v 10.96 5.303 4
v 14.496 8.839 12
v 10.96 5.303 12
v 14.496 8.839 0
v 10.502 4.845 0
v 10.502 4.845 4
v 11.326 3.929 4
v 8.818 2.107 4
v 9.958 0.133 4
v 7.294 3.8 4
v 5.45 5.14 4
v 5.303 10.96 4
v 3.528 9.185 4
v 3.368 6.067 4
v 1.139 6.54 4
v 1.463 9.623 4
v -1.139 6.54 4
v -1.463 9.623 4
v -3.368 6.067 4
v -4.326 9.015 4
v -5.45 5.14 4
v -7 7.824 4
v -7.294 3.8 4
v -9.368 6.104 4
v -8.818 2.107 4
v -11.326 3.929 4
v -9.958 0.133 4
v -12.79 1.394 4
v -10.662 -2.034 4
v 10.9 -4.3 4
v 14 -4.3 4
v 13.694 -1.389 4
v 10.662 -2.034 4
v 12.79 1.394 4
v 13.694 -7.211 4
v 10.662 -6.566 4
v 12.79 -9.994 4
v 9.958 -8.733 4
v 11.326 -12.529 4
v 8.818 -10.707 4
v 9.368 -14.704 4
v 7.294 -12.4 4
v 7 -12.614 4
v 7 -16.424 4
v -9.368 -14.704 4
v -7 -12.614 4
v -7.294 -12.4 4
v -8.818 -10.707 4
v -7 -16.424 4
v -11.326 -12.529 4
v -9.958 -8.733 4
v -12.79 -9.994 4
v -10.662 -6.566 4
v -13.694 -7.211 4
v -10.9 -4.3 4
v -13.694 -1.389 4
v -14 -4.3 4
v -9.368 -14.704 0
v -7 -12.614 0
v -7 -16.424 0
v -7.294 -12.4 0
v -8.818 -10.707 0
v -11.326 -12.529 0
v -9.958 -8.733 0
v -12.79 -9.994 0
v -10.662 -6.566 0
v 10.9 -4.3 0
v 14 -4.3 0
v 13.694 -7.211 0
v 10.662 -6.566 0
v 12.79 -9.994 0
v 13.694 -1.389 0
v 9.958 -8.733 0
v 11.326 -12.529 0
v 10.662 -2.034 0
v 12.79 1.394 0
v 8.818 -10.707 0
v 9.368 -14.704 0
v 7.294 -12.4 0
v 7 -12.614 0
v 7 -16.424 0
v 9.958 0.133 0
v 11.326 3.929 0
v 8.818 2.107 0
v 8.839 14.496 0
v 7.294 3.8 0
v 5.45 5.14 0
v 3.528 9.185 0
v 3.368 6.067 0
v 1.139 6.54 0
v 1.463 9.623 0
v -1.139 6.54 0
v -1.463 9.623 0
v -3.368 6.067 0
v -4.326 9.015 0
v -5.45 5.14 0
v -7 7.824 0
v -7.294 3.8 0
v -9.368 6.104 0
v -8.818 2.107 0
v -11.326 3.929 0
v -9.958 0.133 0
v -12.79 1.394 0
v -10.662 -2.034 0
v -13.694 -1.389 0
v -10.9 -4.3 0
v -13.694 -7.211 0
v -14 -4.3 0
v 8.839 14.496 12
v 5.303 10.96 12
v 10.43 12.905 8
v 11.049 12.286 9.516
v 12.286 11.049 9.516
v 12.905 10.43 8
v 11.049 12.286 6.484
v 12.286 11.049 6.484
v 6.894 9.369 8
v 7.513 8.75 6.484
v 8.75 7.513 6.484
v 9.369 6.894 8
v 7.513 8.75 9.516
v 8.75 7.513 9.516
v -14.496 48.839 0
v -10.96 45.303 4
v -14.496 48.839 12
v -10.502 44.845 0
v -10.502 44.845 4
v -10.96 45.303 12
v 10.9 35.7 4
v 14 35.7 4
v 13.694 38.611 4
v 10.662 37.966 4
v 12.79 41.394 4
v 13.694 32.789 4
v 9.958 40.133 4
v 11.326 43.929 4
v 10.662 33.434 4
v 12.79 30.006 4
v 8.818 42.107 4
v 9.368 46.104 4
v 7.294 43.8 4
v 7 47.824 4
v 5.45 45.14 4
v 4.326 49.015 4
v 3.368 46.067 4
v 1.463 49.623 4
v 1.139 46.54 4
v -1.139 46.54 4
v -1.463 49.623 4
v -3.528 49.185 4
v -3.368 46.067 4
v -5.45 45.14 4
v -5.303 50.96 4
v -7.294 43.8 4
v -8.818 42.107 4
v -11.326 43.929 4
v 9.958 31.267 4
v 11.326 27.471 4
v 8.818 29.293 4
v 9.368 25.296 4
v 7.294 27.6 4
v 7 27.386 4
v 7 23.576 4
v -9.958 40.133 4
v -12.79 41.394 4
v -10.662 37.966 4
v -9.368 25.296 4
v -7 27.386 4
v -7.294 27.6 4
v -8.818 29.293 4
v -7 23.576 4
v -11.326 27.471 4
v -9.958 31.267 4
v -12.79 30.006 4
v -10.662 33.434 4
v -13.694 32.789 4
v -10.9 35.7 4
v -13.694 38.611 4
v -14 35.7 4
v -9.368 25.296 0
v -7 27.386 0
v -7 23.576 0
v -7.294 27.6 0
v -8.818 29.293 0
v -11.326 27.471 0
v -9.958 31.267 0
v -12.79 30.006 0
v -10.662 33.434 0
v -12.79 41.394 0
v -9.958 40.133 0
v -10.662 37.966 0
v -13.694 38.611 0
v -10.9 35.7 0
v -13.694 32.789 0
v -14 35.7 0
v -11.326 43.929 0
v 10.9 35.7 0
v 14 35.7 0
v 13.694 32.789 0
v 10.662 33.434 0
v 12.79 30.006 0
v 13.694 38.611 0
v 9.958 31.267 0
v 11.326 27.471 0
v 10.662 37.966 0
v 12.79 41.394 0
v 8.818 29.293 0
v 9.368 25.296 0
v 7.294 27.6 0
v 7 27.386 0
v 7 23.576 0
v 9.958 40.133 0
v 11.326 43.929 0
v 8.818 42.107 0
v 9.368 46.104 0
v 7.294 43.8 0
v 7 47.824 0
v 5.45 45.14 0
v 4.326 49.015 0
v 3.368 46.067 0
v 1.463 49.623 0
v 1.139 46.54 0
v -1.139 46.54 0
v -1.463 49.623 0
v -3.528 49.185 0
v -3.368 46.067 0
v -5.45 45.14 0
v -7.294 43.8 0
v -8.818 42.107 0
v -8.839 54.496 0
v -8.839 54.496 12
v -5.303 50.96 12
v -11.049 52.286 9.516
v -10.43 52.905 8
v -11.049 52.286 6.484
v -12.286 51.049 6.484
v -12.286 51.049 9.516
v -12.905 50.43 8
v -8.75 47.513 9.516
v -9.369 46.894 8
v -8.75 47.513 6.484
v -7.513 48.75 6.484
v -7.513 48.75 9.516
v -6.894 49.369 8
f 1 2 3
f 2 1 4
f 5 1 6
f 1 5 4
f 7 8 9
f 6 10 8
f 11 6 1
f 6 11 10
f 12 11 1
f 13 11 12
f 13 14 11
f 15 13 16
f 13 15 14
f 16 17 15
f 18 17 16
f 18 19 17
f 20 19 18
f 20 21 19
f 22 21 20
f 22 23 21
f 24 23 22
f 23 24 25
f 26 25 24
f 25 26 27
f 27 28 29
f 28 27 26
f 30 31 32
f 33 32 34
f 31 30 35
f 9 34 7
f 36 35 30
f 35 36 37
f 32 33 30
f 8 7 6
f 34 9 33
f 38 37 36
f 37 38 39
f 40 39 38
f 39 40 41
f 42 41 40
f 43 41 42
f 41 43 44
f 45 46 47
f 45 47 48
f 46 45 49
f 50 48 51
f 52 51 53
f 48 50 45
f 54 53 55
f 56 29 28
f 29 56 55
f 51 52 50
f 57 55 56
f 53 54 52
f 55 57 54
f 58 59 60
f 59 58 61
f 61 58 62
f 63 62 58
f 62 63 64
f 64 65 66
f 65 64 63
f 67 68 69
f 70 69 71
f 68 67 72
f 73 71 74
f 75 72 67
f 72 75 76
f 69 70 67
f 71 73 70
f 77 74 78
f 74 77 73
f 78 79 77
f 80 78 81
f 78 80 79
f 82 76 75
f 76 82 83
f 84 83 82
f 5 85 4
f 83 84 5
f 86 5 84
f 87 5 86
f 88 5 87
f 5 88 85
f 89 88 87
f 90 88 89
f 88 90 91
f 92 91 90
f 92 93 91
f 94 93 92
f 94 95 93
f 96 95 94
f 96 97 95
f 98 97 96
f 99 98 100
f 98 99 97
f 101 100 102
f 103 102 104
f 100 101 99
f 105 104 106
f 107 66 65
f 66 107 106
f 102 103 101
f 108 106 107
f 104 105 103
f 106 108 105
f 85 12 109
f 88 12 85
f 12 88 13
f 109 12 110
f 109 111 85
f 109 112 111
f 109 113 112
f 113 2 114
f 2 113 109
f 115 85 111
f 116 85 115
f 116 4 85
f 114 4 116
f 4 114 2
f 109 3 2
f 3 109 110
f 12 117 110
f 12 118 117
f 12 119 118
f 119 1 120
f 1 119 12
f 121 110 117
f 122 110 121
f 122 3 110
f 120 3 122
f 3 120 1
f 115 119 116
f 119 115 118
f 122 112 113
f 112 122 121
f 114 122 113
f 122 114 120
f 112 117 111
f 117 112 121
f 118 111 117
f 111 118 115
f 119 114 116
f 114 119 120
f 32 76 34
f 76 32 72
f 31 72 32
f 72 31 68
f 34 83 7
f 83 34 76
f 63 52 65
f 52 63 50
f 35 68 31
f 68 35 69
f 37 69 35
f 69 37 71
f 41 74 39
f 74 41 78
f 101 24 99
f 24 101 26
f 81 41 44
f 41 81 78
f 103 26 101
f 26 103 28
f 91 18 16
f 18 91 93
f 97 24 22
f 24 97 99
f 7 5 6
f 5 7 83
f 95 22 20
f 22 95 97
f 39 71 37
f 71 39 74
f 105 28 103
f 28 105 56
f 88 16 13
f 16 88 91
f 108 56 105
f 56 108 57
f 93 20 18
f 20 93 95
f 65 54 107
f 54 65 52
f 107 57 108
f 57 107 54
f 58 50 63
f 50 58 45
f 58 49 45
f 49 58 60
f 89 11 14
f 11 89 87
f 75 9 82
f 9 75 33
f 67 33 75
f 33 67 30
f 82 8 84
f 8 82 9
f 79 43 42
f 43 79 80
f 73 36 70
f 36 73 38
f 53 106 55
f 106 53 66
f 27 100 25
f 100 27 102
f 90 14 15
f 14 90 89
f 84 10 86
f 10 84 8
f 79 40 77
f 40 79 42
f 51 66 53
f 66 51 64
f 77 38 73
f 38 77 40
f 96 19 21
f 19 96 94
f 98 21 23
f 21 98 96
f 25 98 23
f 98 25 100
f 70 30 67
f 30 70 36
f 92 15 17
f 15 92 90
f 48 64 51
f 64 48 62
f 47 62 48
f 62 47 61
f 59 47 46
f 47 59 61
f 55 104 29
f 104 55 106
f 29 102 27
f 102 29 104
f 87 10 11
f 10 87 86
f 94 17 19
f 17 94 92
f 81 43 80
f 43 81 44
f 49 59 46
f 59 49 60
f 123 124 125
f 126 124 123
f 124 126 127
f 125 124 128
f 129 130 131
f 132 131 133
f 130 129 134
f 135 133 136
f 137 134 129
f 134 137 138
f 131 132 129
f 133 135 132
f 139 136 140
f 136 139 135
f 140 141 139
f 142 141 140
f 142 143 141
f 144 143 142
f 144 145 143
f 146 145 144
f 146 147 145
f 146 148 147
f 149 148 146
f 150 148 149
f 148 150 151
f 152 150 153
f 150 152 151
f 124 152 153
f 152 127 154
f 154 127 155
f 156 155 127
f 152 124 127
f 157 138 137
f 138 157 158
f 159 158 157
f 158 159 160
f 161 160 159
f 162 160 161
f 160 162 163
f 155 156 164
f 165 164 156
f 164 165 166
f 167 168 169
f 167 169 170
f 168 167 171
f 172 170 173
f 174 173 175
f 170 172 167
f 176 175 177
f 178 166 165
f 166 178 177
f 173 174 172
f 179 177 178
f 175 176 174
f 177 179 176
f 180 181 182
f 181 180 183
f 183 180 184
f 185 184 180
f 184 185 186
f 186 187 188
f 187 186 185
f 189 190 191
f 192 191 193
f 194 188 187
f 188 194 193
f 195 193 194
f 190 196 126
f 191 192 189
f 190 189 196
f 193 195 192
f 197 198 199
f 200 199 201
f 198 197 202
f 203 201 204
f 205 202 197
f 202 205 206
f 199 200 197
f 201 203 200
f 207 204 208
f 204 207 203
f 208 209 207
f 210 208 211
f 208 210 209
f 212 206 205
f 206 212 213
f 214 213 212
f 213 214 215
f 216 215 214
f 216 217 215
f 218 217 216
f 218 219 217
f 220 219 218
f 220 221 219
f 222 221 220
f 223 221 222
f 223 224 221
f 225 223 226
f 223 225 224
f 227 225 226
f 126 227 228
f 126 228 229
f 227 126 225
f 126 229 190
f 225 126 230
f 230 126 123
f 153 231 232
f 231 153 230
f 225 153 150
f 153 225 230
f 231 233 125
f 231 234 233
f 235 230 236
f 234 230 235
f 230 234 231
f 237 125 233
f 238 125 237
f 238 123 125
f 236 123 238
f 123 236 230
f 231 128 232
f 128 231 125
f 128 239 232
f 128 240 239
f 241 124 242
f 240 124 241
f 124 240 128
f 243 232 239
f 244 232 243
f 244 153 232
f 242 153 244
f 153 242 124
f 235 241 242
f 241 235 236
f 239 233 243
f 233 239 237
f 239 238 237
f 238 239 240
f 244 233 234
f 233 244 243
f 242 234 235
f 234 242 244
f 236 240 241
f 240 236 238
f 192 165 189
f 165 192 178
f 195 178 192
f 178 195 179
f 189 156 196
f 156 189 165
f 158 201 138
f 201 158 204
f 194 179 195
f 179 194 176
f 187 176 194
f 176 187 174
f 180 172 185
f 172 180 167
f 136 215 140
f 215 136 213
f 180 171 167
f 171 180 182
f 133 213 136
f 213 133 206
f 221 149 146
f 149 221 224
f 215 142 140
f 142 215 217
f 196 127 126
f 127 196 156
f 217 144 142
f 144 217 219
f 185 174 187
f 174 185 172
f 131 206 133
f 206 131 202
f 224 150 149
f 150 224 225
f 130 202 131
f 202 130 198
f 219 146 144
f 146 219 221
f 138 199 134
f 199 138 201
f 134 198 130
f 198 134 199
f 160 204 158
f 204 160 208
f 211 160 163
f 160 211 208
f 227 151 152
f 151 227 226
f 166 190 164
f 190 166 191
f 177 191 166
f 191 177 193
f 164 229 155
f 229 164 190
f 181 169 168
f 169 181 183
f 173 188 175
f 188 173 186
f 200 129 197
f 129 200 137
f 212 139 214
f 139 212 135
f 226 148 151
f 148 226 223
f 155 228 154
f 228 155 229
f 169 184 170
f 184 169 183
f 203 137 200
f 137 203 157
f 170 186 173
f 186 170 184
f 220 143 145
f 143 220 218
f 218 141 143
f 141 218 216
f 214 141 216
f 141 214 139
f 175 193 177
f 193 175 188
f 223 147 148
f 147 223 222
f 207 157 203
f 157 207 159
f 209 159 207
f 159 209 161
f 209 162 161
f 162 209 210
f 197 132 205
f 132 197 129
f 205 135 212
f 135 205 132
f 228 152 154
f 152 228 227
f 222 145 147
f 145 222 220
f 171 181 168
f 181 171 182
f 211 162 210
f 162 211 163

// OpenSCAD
// [FL_INDEX: keywords="openscad, 3d_parametric, Parametric_MakerGear_X-carriage_40mm_Fan_Mount, csg_solid" | COT="Parametric OpenSCAD design from 3DCodeverse"]
// Title: Parametric MakerGear X-carriage 40mm Fan Mount

// Set your fan angle as desired
fan_angle = 45; // [0:90]

fan_clip();

translate([0,40,0])
mirror([1,0,0])
fan_clip();

module fan_clip()
{
	rotate([0,0,-fan_angle])
	difference()
	{
		union()
		{
			translate([-4,8.5,0])
			cube([8,8,4]);

			translate([-4,11.5,0])
			cube([8,5,12]);
		}

		translate([0,20,8])
		rotate([90,0,0])
		cylinder(r=3.5/2, h=15);
	}

	difference(){
		translate([0,-4.3,0])
		cylinder(r=14, h=4);

		translate([0,-4.3,-1])
		cylinder(r=10.9, h=6);

		translate([-7,-20,-1])
		cube([14,10,6]);
	}
}
